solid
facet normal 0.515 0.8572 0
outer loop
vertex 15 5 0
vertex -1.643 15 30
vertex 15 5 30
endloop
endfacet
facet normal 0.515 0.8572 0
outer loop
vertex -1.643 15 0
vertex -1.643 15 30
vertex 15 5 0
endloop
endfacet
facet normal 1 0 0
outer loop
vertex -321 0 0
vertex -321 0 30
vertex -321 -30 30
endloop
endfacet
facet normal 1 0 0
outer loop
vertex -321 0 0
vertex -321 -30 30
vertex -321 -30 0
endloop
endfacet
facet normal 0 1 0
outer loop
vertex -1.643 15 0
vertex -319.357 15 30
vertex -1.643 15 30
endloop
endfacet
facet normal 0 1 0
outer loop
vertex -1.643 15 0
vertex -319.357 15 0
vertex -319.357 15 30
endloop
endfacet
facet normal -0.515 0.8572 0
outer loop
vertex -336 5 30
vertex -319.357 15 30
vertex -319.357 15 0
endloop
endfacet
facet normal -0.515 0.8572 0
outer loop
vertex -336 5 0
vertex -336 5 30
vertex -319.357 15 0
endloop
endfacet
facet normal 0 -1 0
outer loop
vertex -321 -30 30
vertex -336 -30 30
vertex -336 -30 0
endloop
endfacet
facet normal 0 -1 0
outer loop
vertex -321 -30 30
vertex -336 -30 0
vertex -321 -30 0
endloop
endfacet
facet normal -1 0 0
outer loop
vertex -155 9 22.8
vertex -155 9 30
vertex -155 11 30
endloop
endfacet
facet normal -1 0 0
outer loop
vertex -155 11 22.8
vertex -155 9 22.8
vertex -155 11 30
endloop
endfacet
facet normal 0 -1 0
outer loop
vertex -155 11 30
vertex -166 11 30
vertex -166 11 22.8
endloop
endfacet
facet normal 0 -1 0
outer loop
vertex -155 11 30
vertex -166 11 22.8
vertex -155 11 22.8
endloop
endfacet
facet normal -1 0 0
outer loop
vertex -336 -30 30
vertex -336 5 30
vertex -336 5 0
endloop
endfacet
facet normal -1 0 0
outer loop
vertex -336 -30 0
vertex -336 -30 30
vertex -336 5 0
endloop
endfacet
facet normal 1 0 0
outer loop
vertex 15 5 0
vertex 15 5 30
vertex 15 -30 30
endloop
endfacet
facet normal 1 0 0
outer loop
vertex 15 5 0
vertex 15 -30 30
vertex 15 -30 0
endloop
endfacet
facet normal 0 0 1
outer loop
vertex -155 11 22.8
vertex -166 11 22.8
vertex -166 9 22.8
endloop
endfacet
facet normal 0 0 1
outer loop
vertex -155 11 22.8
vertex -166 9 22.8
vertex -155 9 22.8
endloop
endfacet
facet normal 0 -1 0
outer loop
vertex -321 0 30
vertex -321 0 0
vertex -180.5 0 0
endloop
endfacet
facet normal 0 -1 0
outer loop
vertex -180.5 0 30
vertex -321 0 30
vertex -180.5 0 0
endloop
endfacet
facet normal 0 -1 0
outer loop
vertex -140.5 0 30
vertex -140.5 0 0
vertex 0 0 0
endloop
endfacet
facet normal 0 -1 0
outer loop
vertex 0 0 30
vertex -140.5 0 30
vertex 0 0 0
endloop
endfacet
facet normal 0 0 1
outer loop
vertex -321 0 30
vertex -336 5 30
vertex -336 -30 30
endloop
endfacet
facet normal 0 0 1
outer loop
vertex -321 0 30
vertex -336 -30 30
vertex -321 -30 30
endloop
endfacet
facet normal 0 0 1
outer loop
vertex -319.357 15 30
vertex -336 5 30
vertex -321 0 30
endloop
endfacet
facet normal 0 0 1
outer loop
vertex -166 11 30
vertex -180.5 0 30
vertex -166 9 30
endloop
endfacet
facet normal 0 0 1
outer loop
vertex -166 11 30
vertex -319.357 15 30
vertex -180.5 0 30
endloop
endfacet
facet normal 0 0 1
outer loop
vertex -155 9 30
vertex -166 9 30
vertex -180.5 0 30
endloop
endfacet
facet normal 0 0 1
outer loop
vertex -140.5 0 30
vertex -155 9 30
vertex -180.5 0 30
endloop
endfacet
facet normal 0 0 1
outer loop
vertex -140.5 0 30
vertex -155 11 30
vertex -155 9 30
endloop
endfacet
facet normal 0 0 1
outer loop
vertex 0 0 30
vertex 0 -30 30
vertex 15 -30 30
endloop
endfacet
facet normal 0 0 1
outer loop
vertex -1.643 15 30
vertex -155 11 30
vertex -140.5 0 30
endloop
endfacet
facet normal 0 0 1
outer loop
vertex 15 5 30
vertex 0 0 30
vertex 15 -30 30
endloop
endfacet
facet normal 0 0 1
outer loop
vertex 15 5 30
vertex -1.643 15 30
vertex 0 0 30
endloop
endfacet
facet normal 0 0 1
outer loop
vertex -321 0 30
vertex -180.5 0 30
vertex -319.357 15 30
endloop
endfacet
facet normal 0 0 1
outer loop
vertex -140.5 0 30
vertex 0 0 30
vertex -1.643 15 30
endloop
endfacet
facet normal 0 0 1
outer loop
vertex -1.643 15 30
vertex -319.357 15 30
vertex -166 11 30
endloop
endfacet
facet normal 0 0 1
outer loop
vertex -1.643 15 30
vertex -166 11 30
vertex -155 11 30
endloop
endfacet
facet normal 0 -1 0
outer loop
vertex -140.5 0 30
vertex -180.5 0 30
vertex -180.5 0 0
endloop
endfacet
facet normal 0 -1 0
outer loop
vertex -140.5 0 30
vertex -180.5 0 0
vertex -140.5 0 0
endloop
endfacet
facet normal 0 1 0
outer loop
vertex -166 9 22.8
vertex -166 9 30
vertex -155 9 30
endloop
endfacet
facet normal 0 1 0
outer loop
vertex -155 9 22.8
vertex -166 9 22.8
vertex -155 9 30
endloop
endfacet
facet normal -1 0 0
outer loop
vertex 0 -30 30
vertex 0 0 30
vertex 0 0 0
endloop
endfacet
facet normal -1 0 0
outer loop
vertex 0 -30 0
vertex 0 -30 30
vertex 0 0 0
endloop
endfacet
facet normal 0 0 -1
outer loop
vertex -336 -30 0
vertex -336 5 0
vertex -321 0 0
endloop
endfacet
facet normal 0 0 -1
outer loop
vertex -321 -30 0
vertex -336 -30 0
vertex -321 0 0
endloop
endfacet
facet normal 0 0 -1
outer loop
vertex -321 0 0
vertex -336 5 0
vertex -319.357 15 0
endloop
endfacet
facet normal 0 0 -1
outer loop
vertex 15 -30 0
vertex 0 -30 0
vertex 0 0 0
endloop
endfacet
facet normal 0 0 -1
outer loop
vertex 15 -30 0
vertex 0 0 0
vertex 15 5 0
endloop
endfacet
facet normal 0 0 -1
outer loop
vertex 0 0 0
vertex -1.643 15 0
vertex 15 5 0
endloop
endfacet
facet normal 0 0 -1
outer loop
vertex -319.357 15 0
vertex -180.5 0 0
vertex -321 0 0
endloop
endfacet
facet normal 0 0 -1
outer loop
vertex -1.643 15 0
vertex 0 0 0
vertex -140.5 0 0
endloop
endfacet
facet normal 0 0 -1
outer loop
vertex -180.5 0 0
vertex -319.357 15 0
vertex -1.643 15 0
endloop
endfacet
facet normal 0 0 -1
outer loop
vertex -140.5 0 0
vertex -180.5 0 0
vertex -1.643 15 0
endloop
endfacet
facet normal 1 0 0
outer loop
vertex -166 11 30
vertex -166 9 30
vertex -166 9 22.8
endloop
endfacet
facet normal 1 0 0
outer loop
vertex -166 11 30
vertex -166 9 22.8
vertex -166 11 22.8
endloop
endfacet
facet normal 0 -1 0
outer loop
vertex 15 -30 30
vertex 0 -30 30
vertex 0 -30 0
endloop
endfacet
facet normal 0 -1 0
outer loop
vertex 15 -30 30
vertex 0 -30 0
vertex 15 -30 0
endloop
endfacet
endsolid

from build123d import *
from OCP.BRepFilletAPI import BRepFilletAPI_MakeChamfer

# Parameters (mm, degrees)
SKETCH1_W           = 321
SKETCH1_H           = 30
BOSS_EXTRUDE1_DEPTH = 15
SKETCH2_W           = 15
SKETCH2_H           = 30
BOSS_EXTRUDE2_DEPTH = 45
SKETCH3_W           = 40
SKETCH3_H           = 30
BOSS_EXTRUDE3_DEPTH = 0.0001
SKETCH4_W           = 11
SKETCH4_H           = 2
CUT_EXTRUDE1_DEPTH  = 7.2
CHAMFER1_SIZE       = 10
CHAMFER1_SIZE2      = 16.642794824


with BuildPart() as part:
    # Sketch1 → Boss-Extrude1 (new body)
    with BuildSketch(Plane(origin=(0, 0, 0), x_dir=(1, 0, 0), z_dir=(0, 1, 0))):
        with Locations((-160.5, -15)):
            Rectangle(SKETCH1_W, SKETCH1_H)
    extrude(amount=BOSS_EXTRUDE1_DEPTH)

    # Sketch2 → Boss-Extrude2 (add)
    with BuildSketch(Plane(origin=(0, 15, 0), x_dir=(1, 0, 0), z_dir=(0, 1, 0))):
        with Locations((-328.5, -15)):
            Rectangle(SKETCH2_W, SKETCH2_H)
        with Locations((7.5, -15)):
            Rectangle(SKETCH2_W, SKETCH2_H)
    extrude(amount=-BOSS_EXTRUDE2_DEPTH)

    # Sketch3 → Boss-Extrude3 (add)
    with BuildSketch(Plane.XZ):
        with Locations((-160.5, 15)):
            Rectangle(SKETCH3_W, SKETCH3_H)
    extrude(amount=BOSS_EXTRUDE3_DEPTH)

    # Sketch4 → Cut-Extrude1 (cut)
    with BuildSketch(Plane.XY.offset(30)):
        with Locations((-160.5, 10)):
            Rectangle(SKETCH4_W, SKETCH4_H)
    extrude(amount=-CUT_EXTRUDE1_DEPTH, mode=Mode.SUBTRACT)

    # Chamfer1: one chamfer whose edges measure the first distance from different faces: ONE call of the kernel's chamfer builder (chamfer() names one face for all edges)
    chamfer1_edges_1 = [part.edges().sort_by_distance(p)[0] for p in [
        (-336, 15, 15),
    ]]
    chamfer1_side_1 = [part.faces().sort_by_distance(p)[0] for p in [
        (-336, -7.5, 15),
    ]]
    chamfer1_edges_2 = [part.edges().sort_by_distance(p)[0] for p in [
        (15, 15, 15),
    ]]
    chamfer1_side_2 = [part.faces().sort_by_distance(p)[0] for p in [
        (15, -7.5, 15),
    ]]
    chamfer1 = BRepFilletAPI_MakeChamfer(part.part.solid().wrapped)
    for e in chamfer1_edges_1:
        chamfer1.Add(CHAMFER1_SIZE, CHAMFER1_SIZE2, e.wrapped, chamfer1_side_1[0].wrapped)  # the first distance lies on this face
    for e in chamfer1_edges_2:
        chamfer1.Add(CHAMFER1_SIZE, CHAMFER1_SIZE2, e.wrapped, chamfer1_side_2[0].wrapped)  # the first distance lies on this face
    add(Compound.cast(chamfer1.Shape()), mode=Mode.REPLACE)


solid = part.part
